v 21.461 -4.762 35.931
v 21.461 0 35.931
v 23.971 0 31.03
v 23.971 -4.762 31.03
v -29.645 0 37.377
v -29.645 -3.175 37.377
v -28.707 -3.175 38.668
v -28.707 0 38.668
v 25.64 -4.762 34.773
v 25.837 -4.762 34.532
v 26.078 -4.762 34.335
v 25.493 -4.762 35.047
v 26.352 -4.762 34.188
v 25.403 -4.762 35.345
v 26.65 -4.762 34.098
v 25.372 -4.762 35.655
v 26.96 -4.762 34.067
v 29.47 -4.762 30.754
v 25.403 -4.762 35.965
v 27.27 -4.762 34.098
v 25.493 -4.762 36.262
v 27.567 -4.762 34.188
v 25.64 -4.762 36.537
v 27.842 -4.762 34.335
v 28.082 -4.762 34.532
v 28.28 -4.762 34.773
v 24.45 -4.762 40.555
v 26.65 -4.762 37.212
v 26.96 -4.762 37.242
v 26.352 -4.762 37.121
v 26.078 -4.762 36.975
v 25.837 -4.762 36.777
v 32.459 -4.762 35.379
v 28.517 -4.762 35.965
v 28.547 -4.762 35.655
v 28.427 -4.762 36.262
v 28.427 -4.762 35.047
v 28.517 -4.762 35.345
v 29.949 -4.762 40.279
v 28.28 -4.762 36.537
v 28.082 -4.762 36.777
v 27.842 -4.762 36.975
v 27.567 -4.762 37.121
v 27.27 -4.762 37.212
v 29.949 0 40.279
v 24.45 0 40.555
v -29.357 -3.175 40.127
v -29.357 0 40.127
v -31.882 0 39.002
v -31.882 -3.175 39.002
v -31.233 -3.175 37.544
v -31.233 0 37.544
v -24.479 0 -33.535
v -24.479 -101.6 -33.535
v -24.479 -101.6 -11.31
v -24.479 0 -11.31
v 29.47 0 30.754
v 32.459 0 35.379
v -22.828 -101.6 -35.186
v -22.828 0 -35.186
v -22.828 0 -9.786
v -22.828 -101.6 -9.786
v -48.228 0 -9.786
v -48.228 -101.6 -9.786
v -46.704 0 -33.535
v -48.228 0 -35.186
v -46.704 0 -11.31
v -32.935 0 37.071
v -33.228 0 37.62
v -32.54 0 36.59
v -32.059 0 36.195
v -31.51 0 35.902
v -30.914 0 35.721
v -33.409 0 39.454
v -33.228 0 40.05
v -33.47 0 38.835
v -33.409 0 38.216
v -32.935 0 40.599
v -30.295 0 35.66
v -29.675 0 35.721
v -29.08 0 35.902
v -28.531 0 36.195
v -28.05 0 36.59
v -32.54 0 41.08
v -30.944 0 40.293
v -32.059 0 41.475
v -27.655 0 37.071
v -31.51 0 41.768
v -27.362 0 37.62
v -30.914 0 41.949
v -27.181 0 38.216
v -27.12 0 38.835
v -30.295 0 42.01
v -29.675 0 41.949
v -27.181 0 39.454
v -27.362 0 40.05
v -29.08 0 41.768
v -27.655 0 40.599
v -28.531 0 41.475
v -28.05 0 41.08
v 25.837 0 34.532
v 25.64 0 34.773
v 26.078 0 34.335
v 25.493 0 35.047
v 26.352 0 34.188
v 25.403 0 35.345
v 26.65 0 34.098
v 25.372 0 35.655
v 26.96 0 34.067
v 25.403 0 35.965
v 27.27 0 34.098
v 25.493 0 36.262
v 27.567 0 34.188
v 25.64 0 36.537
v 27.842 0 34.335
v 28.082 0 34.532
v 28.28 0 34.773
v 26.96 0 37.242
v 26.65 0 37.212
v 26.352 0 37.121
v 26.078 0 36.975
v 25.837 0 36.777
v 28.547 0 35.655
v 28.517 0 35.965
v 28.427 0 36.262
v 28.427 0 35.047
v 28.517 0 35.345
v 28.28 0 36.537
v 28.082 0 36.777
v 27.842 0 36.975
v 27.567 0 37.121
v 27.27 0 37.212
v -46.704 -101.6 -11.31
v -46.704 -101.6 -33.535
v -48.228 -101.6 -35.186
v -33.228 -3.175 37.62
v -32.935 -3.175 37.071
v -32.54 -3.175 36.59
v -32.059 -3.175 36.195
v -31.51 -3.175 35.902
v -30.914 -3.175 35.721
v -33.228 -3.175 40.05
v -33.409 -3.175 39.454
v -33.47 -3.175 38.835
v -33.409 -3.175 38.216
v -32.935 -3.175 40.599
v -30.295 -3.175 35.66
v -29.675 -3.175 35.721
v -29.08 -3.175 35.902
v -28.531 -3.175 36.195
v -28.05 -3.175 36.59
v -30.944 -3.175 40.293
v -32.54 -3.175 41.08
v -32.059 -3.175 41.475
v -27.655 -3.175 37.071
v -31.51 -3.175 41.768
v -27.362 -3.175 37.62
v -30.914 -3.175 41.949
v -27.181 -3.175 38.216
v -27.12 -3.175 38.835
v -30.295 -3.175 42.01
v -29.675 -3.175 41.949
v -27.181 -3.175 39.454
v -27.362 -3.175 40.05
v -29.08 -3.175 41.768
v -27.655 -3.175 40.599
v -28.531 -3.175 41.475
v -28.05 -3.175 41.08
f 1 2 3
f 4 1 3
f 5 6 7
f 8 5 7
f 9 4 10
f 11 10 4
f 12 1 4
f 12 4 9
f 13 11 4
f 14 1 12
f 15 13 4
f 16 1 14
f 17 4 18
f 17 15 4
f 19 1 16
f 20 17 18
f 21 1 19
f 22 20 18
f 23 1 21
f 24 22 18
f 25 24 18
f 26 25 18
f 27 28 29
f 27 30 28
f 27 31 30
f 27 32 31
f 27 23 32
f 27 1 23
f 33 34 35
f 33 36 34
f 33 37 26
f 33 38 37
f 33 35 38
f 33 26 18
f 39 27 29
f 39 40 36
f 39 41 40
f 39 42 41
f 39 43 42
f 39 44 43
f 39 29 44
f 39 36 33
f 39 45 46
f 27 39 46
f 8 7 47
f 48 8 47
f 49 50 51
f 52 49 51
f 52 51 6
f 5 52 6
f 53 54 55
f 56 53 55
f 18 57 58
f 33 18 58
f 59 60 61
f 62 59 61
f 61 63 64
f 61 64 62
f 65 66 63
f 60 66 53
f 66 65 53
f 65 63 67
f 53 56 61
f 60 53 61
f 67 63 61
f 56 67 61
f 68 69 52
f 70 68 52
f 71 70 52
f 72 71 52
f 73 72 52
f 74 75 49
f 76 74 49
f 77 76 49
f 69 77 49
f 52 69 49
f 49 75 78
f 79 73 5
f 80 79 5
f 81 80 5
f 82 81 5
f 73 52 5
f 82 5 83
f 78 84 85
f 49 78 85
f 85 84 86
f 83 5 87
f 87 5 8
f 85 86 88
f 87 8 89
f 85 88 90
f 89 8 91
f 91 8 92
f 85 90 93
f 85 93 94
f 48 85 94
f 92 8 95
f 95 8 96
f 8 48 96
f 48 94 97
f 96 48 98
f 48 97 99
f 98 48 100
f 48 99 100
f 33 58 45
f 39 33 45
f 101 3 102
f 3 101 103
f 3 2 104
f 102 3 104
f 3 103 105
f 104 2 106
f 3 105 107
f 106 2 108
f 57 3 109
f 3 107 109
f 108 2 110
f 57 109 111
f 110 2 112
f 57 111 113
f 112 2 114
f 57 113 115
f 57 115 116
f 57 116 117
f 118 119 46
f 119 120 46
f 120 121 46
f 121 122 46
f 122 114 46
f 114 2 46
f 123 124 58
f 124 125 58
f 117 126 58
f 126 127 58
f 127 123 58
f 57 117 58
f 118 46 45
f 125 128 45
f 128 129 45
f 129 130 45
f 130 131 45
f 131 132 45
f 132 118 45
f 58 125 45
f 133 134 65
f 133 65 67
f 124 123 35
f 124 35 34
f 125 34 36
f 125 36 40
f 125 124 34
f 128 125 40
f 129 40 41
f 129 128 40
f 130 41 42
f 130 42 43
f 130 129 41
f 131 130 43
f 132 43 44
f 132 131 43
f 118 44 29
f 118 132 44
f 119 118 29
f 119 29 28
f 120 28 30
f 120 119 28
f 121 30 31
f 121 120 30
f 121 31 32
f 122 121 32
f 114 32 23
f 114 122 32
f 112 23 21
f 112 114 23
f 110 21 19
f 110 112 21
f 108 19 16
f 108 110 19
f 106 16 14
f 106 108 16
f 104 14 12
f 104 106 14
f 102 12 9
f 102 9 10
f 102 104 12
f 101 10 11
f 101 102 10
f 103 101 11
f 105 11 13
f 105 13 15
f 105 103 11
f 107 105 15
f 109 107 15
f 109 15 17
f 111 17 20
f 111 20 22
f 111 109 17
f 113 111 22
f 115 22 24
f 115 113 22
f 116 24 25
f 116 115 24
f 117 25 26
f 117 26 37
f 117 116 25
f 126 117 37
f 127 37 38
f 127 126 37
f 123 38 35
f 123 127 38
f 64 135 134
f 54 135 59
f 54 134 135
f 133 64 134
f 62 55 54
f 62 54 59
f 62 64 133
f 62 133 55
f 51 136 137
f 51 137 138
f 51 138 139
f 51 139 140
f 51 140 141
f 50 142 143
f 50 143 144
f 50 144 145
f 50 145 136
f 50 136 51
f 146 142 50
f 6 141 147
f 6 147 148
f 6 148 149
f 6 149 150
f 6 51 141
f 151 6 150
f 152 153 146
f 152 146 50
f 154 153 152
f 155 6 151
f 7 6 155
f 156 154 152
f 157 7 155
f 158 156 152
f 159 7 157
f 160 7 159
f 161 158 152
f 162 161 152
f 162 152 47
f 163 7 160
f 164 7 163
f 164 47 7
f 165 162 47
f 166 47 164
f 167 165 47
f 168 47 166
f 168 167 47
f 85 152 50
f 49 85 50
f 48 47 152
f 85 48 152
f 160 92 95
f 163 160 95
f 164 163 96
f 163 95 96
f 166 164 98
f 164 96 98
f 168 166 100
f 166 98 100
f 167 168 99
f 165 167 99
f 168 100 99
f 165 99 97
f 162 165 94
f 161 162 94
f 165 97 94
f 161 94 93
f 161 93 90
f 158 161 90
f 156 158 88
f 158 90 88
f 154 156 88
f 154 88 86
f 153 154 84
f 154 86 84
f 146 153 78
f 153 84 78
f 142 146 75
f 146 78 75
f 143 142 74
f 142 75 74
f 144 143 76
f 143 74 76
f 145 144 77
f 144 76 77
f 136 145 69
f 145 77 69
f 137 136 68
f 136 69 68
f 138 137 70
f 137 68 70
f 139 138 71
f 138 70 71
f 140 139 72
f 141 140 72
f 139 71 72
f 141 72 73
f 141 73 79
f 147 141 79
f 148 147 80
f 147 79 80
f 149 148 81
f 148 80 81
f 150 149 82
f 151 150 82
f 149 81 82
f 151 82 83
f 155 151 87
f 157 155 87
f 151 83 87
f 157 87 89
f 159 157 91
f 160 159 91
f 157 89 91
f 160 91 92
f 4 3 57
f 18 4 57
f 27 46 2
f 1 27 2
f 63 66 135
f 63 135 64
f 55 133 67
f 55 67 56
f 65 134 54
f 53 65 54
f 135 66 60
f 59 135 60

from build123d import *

# Parameters (mm, degrees)
F0_R      = 3.175
F1_DEPTH  = 3.175
F3_DEPTH  = 3.175
F6_R      = 1.5875
F7_DEPTH  = 4.7625
F8_W      = 25.4
F8_H      = 25.4
F9_DEPTH  = 101.6
F10_W     = 22.225
F10_H     = 22.225
F12_DEPTH = 101.6


# Not quite as in the source:
# - the program builds the solid bodies; features that only make, move or delete a surface that nothing else refers to are left out


with BuildPart() as f1:
    # F0 (on Front) → F1 (new body)
    with BuildSketch(Plane.XZ):
        with Locations((-30.2948281169, 38.8350300491)):
            Circle(F0_R)
    extrude(amount=F1_DEPTH)

    # F2 (on face) → F3 (cut)
    with BuildSketch(Plane.XZ.offset(3.175)):
        Polygon((-30.9442792982, 40.2931563394), (-31.8823281169, 39.0016519727), (-31.2328769355, 37.5435256824), (-29.6453769355, 37.3769037588), (-28.7073281169, 38.6684081255), (-29.3567792982, 40.1265344158), align=None)
    extrude(amount=-F3_DEPTH, mode=Mode.SUBTRACT)


with BuildPart() as f7:
    # F6 (on Front) → F7 (new body)
    with BuildSketch(Plane.XZ):
        Polygon((29.470242978, 30.7541721055), (32.4591536764, 35.3785237092), (29.9488030608, 40.2791721055), (24.4495417467, 40.5554688981), (21.4606310483, 35.9311172944), (23.9709816639, 31.0304688981), align=None)
        with Locations((26.9598923624, 35.6548205018)):
            Circle(F6_R, mode=Mode.SUBTRACT)
    extrude(amount=F7_DEPTH)


with BuildPart() as f9:
    # F8 (on Front) → F9 (new body)
    with BuildSketch(Plane.XZ):
        with Locations((-34.0042514727, -24.0096593054)):
            Rectangle(F8_W, F8_H)
    extrude(amount=F9_DEPTH)


with BuildPart() as f9_1:
    # F11: moved
    add(f9.part.moved(Location((-1.524, 0, 1.524))))

    # F10 (on face) → F12 (cut)
    with BuildSketch(Plane.XZ.offset(101.6)):
        with Locations((-35.5917514727, -22.4221593054)):
            Rectangle(F10_W, F10_H)
    extrude(amount=-F12_DEPTH, mode=Mode.SUBTRACT)


solid = Compound([f1.part, f7.part, f9_1.part])
